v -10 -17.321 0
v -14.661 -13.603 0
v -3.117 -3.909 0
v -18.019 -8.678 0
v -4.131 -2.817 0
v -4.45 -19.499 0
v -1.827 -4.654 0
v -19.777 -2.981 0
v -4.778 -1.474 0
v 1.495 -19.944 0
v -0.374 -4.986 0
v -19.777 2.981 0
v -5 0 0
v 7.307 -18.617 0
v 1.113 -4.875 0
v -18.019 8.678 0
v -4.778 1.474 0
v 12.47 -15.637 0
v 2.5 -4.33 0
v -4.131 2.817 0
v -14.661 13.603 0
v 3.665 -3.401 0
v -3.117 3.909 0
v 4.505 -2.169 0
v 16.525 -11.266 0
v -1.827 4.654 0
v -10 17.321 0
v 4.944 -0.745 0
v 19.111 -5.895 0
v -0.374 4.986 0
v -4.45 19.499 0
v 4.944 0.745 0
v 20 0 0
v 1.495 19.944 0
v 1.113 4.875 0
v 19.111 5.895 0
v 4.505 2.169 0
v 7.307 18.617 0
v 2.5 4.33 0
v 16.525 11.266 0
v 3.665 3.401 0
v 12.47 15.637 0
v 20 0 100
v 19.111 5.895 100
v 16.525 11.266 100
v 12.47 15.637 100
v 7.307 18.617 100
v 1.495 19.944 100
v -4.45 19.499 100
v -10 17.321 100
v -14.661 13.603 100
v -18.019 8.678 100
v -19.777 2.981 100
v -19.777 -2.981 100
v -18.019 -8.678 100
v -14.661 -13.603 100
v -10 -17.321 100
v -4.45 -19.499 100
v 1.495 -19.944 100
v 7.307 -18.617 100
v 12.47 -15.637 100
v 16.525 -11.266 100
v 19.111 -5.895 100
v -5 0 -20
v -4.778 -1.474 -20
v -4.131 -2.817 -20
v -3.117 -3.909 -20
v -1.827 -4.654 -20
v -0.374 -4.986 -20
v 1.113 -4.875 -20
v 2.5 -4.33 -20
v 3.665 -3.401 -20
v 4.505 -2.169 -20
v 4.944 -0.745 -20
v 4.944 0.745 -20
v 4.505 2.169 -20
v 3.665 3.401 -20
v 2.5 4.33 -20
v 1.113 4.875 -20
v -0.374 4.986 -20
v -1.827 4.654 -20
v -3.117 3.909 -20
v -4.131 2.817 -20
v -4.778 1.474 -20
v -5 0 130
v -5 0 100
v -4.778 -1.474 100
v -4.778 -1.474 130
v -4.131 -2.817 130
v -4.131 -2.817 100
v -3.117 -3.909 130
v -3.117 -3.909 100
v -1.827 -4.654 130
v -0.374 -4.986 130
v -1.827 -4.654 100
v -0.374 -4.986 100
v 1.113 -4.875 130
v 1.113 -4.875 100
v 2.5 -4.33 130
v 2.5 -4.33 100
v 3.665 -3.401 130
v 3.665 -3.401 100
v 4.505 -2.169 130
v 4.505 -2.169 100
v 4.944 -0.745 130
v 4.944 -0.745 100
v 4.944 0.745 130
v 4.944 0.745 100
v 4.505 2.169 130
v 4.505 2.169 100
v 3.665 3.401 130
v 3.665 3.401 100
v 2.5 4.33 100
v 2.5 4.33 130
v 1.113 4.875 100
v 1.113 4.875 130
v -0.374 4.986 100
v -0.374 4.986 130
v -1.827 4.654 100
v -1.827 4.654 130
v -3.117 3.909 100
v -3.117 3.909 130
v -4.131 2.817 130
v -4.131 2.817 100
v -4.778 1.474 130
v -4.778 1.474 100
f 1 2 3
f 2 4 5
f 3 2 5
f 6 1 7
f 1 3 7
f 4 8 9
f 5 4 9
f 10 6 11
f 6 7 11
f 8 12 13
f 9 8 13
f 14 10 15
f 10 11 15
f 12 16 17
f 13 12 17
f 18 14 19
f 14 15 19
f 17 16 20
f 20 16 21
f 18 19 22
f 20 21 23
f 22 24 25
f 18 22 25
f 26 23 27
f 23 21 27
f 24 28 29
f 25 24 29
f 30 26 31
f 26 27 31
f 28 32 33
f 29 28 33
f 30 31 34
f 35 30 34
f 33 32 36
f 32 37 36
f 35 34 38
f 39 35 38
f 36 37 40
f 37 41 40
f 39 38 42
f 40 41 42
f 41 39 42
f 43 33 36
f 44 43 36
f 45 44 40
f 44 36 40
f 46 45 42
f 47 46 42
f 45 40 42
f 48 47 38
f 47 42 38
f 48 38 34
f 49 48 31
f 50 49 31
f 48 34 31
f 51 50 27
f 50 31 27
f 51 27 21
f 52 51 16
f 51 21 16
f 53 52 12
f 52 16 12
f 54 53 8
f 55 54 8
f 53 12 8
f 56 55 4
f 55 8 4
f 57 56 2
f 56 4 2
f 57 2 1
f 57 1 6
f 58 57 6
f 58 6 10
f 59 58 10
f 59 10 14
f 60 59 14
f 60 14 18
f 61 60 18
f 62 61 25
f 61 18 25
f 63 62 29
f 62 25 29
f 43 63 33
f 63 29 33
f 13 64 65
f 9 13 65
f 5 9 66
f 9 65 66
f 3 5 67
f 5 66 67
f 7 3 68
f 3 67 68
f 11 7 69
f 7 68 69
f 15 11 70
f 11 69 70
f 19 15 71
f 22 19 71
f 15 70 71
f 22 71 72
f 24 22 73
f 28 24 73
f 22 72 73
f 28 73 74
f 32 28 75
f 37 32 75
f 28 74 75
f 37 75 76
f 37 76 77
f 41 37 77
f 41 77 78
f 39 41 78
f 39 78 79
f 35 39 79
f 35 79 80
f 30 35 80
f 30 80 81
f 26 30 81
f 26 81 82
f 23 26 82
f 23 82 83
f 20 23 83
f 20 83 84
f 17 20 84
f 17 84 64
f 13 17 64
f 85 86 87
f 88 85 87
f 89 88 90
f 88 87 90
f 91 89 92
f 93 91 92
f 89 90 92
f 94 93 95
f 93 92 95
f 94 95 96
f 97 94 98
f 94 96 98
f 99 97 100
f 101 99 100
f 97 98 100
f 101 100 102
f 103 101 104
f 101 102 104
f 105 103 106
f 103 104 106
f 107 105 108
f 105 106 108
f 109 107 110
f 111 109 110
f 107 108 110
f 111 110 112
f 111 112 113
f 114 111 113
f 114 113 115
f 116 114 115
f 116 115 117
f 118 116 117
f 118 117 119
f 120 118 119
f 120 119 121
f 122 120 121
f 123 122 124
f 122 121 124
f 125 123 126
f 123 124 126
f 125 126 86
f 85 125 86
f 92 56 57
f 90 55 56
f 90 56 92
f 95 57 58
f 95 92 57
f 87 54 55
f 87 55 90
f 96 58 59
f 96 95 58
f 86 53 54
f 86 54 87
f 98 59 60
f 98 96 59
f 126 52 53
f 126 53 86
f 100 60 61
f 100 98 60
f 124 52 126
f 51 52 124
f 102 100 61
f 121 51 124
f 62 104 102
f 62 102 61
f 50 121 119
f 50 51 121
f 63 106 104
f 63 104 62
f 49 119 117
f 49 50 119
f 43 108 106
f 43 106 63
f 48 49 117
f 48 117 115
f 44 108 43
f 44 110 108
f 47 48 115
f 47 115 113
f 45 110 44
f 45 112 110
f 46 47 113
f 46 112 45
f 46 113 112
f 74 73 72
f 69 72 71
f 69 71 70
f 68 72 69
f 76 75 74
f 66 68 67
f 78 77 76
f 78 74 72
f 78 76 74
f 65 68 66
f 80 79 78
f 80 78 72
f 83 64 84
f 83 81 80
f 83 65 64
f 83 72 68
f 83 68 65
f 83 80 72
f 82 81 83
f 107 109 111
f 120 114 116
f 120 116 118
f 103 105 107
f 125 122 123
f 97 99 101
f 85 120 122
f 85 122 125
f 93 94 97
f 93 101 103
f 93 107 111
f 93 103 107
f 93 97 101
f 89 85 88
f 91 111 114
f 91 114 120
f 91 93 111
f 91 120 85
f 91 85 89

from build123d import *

# Parameters (mm, degrees)
SKETCH1_R           = 20
BOSS_EXTRUDE1_DEPTH = 100
SKETCH2_R           = 5
BOSS_EXTRUDE2_DEPTH = 30
LPATTERN1_COUNT     = 2
LPATTERN1_PITCH     = 130
SKETCH3_R           = 7.5
CUT_EXTRUDE1_DEPTH  = 10


with BuildPart() as part:
    # Sketch1 → Boss-Extrude1 (new body)
    with BuildSketch(Plane.XY):
        Circle(SKETCH1_R)
    extrude(amount=BOSS_EXTRUDE1_DEPTH)

    # Sketch2 → Boss-Extrude2 (add)
    with BuildSketch(Plane.XY.offset(100)):
        with Locations(Location((0, 0, 0), (0, 0, 180))):
            Circle(SKETCH2_R)
    boss_extrude2 = extrude(amount=BOSS_EXTRUDE2_DEPTH)

    # LPattern1: Boss-Extrude2 ×2
    with Locations(*[(0, 0, -i * LPATTERN1_PITCH) for i in range(1, LPATTERN1_COUNT)]):
        add(boss_extrude2)

    # Sketch3 → Cut-Extrude1 (cut)
    with BuildSketch(Plane(origin=(0, 0, -30), x_dir=(-1, 0, 0), z_dir=(0, 0, -1))):
        Circle(SKETCH3_R)
    extrude(amount=-CUT_EXTRUDE1_DEPTH, mode=Mode.SUBTRACT)


solid = part.part
